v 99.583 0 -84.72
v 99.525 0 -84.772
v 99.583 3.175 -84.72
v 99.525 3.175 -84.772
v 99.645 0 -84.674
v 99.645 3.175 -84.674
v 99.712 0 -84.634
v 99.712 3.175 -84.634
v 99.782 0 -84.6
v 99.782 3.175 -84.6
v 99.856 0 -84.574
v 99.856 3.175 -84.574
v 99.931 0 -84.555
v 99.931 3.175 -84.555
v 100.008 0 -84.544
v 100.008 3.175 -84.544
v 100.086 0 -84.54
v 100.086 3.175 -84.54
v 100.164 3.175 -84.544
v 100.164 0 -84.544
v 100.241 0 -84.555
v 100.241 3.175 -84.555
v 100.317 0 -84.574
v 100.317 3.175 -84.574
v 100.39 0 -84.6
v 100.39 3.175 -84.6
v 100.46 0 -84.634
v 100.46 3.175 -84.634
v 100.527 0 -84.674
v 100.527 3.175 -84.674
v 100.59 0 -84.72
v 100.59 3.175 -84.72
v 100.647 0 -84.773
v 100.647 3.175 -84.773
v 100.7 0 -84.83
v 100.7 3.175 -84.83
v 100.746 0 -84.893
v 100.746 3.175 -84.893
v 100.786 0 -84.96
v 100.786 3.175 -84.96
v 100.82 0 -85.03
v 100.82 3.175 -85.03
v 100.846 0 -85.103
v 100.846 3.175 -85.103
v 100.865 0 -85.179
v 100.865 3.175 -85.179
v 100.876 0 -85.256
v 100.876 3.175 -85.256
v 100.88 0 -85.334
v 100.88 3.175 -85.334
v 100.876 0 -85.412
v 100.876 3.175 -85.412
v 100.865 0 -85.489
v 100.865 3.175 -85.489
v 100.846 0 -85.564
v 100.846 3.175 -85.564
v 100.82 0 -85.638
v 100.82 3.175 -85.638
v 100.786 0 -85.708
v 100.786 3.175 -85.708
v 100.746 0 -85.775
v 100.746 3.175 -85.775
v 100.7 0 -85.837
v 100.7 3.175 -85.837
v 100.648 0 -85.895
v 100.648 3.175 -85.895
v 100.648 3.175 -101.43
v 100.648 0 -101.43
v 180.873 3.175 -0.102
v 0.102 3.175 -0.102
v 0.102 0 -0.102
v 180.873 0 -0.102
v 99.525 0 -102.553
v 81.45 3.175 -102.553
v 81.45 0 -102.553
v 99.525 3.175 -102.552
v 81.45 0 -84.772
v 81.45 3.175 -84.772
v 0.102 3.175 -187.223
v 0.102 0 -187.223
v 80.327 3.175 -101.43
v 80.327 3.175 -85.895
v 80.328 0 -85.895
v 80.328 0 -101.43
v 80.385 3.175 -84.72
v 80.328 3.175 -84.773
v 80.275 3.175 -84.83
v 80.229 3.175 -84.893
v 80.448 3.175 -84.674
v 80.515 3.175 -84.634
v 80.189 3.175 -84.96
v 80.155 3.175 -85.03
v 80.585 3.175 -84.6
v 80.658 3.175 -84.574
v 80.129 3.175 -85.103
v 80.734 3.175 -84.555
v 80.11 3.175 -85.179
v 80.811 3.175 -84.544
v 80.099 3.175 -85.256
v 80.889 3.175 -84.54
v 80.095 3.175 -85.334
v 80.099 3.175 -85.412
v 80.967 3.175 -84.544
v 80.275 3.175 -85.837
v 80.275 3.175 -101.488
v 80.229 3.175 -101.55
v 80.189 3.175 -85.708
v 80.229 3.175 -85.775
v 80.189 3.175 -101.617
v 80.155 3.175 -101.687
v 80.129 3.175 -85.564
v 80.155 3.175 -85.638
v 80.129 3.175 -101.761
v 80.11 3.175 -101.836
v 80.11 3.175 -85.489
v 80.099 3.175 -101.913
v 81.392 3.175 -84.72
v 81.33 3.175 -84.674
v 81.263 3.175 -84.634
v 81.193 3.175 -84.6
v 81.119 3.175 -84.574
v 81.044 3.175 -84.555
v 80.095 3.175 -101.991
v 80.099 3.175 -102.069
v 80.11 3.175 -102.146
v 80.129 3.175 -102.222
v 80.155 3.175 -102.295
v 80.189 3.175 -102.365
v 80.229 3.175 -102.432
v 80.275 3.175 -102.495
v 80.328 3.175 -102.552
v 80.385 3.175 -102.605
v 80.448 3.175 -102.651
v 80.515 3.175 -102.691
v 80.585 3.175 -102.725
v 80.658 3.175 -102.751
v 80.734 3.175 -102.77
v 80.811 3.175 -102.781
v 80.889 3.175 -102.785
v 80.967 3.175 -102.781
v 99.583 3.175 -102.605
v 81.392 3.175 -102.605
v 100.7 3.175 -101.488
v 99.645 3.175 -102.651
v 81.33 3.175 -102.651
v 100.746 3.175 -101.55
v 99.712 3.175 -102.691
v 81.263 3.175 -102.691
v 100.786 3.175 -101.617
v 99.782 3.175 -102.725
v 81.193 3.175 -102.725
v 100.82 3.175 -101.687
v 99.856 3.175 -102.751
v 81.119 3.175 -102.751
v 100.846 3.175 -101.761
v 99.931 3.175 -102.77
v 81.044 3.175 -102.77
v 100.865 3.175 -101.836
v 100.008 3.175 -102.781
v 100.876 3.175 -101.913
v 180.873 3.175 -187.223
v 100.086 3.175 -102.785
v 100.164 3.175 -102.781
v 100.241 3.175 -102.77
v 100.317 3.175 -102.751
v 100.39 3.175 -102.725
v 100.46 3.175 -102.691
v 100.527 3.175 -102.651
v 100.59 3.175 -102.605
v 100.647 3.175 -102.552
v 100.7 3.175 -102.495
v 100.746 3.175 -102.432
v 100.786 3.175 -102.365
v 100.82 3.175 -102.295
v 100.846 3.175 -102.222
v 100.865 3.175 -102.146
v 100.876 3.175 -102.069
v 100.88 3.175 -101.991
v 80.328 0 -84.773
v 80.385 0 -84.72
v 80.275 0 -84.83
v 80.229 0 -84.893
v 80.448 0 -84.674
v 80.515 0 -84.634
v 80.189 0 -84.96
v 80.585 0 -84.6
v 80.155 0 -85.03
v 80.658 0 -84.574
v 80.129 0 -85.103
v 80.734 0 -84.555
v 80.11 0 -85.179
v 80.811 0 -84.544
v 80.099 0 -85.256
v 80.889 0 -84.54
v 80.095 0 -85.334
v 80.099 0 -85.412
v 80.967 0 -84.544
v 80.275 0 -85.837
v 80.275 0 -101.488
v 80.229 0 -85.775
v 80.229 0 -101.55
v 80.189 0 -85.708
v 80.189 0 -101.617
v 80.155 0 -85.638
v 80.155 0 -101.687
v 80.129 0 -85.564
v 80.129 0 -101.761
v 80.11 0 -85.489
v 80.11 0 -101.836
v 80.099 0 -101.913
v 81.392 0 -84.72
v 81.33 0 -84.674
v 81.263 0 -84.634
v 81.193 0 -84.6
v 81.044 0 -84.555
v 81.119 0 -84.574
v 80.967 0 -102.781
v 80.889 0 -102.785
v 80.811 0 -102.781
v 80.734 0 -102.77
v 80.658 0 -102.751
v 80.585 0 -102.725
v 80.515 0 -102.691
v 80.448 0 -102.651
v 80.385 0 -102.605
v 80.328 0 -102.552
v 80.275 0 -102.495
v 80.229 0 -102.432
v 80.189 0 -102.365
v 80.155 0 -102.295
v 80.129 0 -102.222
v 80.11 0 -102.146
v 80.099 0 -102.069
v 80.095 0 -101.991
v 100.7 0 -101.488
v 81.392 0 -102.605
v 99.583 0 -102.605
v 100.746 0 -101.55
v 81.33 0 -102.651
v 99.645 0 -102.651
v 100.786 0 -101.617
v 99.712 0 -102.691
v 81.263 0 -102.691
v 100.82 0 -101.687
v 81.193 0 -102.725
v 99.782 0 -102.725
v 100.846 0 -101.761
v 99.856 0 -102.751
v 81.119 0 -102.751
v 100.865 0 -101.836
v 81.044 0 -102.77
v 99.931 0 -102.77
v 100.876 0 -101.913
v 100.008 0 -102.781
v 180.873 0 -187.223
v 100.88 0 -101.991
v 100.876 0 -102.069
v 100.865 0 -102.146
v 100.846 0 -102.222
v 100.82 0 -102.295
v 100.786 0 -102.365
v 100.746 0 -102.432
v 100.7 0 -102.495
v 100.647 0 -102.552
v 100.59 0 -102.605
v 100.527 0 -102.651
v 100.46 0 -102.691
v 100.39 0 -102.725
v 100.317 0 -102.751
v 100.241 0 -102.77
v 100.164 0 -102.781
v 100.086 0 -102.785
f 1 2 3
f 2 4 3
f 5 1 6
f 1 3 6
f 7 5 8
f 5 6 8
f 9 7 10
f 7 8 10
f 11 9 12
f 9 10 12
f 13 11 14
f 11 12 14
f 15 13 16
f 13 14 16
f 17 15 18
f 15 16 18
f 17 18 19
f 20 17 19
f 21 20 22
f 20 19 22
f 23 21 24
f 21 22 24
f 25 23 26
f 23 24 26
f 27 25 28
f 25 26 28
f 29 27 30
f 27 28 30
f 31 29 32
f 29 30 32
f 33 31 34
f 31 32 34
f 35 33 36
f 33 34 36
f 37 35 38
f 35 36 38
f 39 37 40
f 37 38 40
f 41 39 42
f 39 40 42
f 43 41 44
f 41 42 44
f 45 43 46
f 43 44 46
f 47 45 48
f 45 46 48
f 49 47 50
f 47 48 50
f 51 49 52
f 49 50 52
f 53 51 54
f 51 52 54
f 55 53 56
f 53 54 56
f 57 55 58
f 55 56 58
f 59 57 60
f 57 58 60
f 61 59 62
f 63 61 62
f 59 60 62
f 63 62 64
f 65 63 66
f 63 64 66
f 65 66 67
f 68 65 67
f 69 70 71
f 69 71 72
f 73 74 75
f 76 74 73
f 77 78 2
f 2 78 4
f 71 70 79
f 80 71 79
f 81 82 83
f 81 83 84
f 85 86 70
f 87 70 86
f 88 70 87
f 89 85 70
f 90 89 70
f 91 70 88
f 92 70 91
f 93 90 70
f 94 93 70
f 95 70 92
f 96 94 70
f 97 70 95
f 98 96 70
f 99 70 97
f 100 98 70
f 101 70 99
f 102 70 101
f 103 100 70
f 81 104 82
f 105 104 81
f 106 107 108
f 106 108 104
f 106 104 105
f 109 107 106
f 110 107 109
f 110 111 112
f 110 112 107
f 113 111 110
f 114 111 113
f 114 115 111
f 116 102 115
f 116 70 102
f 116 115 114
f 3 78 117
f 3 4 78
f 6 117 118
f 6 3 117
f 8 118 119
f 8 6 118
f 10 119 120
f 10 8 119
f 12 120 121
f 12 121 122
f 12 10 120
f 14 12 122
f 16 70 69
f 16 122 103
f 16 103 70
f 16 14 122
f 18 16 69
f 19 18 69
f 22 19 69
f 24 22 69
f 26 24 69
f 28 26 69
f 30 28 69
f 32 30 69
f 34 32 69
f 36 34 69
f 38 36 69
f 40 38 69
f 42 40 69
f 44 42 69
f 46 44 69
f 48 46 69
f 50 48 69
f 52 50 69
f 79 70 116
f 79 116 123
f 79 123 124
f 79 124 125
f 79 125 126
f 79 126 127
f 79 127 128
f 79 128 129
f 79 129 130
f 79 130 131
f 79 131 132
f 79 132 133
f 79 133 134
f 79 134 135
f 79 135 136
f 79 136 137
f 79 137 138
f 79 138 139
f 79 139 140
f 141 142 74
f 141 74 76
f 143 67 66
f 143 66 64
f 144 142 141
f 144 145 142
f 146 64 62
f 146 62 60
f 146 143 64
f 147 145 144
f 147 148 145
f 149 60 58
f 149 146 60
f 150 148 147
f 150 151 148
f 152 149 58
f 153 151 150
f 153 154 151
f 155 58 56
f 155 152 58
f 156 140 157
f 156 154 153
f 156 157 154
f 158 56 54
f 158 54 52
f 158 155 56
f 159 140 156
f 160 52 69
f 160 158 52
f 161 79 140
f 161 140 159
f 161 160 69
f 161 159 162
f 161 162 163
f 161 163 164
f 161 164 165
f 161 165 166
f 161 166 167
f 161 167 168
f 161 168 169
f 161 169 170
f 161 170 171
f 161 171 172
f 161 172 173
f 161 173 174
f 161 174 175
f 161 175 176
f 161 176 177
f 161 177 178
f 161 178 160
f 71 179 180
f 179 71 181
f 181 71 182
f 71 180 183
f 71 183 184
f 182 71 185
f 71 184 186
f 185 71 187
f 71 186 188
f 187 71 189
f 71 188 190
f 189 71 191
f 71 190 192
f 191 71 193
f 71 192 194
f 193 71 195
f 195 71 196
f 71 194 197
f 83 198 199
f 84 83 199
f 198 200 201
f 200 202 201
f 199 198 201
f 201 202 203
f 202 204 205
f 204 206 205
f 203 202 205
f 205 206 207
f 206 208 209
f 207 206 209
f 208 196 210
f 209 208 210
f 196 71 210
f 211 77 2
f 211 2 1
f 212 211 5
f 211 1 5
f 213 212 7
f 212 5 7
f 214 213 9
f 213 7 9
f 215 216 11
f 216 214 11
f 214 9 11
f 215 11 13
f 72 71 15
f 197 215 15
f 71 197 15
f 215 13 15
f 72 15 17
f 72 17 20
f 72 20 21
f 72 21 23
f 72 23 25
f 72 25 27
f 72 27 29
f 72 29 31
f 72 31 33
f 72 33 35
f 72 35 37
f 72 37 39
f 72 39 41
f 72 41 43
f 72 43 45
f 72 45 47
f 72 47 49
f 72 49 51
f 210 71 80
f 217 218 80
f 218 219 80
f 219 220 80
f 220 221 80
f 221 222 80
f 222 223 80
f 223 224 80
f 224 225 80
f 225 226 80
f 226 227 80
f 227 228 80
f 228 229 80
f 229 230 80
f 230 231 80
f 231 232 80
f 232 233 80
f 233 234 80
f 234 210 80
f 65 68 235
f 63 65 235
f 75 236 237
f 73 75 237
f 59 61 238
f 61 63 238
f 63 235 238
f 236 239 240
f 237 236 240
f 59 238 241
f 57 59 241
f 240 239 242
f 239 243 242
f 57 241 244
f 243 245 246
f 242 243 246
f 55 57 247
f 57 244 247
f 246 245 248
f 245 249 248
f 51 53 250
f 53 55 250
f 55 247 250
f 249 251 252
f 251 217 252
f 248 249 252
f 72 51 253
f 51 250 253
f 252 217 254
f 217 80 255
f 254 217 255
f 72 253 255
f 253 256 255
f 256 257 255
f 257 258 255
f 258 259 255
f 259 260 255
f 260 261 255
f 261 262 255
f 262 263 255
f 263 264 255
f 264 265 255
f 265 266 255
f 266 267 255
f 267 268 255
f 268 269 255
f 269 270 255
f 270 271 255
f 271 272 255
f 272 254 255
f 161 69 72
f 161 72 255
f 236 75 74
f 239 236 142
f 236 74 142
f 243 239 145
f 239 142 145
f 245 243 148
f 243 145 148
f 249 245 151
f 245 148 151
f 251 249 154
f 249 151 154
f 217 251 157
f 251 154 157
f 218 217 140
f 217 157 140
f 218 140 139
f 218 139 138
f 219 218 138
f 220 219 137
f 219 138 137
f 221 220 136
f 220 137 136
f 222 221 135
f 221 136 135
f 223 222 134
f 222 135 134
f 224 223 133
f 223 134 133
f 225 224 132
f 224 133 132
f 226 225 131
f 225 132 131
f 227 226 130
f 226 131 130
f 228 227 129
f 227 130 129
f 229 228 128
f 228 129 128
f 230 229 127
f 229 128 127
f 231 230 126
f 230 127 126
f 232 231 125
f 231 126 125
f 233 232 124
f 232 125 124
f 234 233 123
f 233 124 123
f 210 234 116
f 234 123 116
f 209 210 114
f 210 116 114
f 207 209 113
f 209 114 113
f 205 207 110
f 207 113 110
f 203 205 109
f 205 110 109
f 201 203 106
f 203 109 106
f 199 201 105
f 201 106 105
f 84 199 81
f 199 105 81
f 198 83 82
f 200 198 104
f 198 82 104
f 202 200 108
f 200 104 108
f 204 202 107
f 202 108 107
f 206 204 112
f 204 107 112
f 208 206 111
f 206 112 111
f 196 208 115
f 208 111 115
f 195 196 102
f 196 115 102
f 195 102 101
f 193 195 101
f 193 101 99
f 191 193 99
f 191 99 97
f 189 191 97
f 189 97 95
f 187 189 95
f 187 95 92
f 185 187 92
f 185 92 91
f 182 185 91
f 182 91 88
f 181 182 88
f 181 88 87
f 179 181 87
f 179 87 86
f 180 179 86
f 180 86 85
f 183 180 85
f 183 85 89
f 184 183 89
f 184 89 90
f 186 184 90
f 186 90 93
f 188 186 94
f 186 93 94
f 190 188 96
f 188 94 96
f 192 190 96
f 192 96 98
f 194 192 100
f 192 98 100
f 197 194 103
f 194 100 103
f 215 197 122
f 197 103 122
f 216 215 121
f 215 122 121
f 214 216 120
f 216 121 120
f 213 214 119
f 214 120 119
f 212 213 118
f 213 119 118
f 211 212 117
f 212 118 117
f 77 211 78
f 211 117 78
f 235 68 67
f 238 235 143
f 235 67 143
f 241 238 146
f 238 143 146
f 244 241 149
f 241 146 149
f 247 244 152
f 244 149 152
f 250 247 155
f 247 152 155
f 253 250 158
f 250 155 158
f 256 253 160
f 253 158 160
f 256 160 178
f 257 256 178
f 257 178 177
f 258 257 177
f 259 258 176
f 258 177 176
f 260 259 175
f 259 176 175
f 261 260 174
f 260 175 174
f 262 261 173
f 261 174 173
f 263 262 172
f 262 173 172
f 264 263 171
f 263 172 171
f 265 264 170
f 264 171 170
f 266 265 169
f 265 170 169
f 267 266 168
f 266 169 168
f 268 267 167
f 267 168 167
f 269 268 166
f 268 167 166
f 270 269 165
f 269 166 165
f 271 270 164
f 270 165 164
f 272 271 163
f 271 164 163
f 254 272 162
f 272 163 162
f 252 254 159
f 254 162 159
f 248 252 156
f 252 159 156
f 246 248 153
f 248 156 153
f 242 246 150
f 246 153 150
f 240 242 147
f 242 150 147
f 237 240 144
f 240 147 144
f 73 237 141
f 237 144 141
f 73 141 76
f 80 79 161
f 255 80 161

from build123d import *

# Parameters (mm, degrees)
SKETCH1_W           = 180.975
SKETCH1_H           = 187.325
BOSS_EXTRUDE1_DEPTH = 3.175
SKETCH2_W           = 20.32
SKETCH2_H           = 17.78
CUT_EXTRUDE1_DEPTH  = 4.175
SKETCH3_R           = 0.79375
CUT_EXTRUDE2_DEPTH  = 3.175
SKETCH4_W           = 180.975
SKETCH4_H           = 187.325
SKETCH4_W_2         = 180.7718
SKETCH4_H_2         = 187.1218
CUT_EXTRUDE3_DEPTH  = 3.175


with BuildPart() as part:
    # Sketch1 → Boss-Extrude1 (new body)
    with BuildSketch(Plane(origin=(0, 0, 0), x_dir=(1, 0, 0), z_dir=(0, 1, 0))):
        with Locations((90.4875, 93.6625)):
            Rectangle(SKETCH1_W, SKETCH1_H)
    extrude(amount=BOSS_EXTRUDE1_DEPTH)

    # Sketch2 → Cut-Extrude1 (cut, through all)
    with BuildSketch(Plane(origin=(0, 3.175, 0), x_dir=(1, 0, 0), z_dir=(0, 1, 0))):
        with Locations((90.4875, 93.6625)):
            Rectangle(SKETCH2_W, SKETCH2_H)
    extrude(amount=-CUT_EXTRUDE1_DEPTH, mode=Mode.SUBTRACT)

    # Sketch3 → Cut-Extrude2 (cut)
    with BuildSketch(Plane(origin=(0, 3.175, 0), x_dir=(1, 0, 0), z_dir=(0, 1, 0))):
        with Locations((80.888766008, 101.991233992)):
            Circle(SKETCH3_R)
        with Locations((100.086233992, 101.991233992)):
            Circle(SKETCH3_R)
        with Locations((80.888766008, 85.333766008)):
            Circle(SKETCH3_R)
        with Locations((100.086233992, 85.333766008)):
            Circle(SKETCH3_R)
    extrude(amount=-CUT_EXTRUDE2_DEPTH, mode=Mode.SUBTRACT)

    # Sketch4 → Cut-Extrude3 (cut)
    with BuildSketch(Plane(origin=(0, 3.175, 0), x_dir=(1, 0, 0), z_dir=(0, 1, 0))):
        with Locations((90.4875, 93.6625)):
            Rectangle(SKETCH4_W, SKETCH4_H)
        with Locations((90.4875, 93.6625)):
            Rectangle(SKETCH4_W_2, SKETCH4_H_2, mode=Mode.SUBTRACT)
    extrude(amount=-CUT_EXTRUDE3_DEPTH, mode=Mode.SUBTRACT)


solid = part.part
